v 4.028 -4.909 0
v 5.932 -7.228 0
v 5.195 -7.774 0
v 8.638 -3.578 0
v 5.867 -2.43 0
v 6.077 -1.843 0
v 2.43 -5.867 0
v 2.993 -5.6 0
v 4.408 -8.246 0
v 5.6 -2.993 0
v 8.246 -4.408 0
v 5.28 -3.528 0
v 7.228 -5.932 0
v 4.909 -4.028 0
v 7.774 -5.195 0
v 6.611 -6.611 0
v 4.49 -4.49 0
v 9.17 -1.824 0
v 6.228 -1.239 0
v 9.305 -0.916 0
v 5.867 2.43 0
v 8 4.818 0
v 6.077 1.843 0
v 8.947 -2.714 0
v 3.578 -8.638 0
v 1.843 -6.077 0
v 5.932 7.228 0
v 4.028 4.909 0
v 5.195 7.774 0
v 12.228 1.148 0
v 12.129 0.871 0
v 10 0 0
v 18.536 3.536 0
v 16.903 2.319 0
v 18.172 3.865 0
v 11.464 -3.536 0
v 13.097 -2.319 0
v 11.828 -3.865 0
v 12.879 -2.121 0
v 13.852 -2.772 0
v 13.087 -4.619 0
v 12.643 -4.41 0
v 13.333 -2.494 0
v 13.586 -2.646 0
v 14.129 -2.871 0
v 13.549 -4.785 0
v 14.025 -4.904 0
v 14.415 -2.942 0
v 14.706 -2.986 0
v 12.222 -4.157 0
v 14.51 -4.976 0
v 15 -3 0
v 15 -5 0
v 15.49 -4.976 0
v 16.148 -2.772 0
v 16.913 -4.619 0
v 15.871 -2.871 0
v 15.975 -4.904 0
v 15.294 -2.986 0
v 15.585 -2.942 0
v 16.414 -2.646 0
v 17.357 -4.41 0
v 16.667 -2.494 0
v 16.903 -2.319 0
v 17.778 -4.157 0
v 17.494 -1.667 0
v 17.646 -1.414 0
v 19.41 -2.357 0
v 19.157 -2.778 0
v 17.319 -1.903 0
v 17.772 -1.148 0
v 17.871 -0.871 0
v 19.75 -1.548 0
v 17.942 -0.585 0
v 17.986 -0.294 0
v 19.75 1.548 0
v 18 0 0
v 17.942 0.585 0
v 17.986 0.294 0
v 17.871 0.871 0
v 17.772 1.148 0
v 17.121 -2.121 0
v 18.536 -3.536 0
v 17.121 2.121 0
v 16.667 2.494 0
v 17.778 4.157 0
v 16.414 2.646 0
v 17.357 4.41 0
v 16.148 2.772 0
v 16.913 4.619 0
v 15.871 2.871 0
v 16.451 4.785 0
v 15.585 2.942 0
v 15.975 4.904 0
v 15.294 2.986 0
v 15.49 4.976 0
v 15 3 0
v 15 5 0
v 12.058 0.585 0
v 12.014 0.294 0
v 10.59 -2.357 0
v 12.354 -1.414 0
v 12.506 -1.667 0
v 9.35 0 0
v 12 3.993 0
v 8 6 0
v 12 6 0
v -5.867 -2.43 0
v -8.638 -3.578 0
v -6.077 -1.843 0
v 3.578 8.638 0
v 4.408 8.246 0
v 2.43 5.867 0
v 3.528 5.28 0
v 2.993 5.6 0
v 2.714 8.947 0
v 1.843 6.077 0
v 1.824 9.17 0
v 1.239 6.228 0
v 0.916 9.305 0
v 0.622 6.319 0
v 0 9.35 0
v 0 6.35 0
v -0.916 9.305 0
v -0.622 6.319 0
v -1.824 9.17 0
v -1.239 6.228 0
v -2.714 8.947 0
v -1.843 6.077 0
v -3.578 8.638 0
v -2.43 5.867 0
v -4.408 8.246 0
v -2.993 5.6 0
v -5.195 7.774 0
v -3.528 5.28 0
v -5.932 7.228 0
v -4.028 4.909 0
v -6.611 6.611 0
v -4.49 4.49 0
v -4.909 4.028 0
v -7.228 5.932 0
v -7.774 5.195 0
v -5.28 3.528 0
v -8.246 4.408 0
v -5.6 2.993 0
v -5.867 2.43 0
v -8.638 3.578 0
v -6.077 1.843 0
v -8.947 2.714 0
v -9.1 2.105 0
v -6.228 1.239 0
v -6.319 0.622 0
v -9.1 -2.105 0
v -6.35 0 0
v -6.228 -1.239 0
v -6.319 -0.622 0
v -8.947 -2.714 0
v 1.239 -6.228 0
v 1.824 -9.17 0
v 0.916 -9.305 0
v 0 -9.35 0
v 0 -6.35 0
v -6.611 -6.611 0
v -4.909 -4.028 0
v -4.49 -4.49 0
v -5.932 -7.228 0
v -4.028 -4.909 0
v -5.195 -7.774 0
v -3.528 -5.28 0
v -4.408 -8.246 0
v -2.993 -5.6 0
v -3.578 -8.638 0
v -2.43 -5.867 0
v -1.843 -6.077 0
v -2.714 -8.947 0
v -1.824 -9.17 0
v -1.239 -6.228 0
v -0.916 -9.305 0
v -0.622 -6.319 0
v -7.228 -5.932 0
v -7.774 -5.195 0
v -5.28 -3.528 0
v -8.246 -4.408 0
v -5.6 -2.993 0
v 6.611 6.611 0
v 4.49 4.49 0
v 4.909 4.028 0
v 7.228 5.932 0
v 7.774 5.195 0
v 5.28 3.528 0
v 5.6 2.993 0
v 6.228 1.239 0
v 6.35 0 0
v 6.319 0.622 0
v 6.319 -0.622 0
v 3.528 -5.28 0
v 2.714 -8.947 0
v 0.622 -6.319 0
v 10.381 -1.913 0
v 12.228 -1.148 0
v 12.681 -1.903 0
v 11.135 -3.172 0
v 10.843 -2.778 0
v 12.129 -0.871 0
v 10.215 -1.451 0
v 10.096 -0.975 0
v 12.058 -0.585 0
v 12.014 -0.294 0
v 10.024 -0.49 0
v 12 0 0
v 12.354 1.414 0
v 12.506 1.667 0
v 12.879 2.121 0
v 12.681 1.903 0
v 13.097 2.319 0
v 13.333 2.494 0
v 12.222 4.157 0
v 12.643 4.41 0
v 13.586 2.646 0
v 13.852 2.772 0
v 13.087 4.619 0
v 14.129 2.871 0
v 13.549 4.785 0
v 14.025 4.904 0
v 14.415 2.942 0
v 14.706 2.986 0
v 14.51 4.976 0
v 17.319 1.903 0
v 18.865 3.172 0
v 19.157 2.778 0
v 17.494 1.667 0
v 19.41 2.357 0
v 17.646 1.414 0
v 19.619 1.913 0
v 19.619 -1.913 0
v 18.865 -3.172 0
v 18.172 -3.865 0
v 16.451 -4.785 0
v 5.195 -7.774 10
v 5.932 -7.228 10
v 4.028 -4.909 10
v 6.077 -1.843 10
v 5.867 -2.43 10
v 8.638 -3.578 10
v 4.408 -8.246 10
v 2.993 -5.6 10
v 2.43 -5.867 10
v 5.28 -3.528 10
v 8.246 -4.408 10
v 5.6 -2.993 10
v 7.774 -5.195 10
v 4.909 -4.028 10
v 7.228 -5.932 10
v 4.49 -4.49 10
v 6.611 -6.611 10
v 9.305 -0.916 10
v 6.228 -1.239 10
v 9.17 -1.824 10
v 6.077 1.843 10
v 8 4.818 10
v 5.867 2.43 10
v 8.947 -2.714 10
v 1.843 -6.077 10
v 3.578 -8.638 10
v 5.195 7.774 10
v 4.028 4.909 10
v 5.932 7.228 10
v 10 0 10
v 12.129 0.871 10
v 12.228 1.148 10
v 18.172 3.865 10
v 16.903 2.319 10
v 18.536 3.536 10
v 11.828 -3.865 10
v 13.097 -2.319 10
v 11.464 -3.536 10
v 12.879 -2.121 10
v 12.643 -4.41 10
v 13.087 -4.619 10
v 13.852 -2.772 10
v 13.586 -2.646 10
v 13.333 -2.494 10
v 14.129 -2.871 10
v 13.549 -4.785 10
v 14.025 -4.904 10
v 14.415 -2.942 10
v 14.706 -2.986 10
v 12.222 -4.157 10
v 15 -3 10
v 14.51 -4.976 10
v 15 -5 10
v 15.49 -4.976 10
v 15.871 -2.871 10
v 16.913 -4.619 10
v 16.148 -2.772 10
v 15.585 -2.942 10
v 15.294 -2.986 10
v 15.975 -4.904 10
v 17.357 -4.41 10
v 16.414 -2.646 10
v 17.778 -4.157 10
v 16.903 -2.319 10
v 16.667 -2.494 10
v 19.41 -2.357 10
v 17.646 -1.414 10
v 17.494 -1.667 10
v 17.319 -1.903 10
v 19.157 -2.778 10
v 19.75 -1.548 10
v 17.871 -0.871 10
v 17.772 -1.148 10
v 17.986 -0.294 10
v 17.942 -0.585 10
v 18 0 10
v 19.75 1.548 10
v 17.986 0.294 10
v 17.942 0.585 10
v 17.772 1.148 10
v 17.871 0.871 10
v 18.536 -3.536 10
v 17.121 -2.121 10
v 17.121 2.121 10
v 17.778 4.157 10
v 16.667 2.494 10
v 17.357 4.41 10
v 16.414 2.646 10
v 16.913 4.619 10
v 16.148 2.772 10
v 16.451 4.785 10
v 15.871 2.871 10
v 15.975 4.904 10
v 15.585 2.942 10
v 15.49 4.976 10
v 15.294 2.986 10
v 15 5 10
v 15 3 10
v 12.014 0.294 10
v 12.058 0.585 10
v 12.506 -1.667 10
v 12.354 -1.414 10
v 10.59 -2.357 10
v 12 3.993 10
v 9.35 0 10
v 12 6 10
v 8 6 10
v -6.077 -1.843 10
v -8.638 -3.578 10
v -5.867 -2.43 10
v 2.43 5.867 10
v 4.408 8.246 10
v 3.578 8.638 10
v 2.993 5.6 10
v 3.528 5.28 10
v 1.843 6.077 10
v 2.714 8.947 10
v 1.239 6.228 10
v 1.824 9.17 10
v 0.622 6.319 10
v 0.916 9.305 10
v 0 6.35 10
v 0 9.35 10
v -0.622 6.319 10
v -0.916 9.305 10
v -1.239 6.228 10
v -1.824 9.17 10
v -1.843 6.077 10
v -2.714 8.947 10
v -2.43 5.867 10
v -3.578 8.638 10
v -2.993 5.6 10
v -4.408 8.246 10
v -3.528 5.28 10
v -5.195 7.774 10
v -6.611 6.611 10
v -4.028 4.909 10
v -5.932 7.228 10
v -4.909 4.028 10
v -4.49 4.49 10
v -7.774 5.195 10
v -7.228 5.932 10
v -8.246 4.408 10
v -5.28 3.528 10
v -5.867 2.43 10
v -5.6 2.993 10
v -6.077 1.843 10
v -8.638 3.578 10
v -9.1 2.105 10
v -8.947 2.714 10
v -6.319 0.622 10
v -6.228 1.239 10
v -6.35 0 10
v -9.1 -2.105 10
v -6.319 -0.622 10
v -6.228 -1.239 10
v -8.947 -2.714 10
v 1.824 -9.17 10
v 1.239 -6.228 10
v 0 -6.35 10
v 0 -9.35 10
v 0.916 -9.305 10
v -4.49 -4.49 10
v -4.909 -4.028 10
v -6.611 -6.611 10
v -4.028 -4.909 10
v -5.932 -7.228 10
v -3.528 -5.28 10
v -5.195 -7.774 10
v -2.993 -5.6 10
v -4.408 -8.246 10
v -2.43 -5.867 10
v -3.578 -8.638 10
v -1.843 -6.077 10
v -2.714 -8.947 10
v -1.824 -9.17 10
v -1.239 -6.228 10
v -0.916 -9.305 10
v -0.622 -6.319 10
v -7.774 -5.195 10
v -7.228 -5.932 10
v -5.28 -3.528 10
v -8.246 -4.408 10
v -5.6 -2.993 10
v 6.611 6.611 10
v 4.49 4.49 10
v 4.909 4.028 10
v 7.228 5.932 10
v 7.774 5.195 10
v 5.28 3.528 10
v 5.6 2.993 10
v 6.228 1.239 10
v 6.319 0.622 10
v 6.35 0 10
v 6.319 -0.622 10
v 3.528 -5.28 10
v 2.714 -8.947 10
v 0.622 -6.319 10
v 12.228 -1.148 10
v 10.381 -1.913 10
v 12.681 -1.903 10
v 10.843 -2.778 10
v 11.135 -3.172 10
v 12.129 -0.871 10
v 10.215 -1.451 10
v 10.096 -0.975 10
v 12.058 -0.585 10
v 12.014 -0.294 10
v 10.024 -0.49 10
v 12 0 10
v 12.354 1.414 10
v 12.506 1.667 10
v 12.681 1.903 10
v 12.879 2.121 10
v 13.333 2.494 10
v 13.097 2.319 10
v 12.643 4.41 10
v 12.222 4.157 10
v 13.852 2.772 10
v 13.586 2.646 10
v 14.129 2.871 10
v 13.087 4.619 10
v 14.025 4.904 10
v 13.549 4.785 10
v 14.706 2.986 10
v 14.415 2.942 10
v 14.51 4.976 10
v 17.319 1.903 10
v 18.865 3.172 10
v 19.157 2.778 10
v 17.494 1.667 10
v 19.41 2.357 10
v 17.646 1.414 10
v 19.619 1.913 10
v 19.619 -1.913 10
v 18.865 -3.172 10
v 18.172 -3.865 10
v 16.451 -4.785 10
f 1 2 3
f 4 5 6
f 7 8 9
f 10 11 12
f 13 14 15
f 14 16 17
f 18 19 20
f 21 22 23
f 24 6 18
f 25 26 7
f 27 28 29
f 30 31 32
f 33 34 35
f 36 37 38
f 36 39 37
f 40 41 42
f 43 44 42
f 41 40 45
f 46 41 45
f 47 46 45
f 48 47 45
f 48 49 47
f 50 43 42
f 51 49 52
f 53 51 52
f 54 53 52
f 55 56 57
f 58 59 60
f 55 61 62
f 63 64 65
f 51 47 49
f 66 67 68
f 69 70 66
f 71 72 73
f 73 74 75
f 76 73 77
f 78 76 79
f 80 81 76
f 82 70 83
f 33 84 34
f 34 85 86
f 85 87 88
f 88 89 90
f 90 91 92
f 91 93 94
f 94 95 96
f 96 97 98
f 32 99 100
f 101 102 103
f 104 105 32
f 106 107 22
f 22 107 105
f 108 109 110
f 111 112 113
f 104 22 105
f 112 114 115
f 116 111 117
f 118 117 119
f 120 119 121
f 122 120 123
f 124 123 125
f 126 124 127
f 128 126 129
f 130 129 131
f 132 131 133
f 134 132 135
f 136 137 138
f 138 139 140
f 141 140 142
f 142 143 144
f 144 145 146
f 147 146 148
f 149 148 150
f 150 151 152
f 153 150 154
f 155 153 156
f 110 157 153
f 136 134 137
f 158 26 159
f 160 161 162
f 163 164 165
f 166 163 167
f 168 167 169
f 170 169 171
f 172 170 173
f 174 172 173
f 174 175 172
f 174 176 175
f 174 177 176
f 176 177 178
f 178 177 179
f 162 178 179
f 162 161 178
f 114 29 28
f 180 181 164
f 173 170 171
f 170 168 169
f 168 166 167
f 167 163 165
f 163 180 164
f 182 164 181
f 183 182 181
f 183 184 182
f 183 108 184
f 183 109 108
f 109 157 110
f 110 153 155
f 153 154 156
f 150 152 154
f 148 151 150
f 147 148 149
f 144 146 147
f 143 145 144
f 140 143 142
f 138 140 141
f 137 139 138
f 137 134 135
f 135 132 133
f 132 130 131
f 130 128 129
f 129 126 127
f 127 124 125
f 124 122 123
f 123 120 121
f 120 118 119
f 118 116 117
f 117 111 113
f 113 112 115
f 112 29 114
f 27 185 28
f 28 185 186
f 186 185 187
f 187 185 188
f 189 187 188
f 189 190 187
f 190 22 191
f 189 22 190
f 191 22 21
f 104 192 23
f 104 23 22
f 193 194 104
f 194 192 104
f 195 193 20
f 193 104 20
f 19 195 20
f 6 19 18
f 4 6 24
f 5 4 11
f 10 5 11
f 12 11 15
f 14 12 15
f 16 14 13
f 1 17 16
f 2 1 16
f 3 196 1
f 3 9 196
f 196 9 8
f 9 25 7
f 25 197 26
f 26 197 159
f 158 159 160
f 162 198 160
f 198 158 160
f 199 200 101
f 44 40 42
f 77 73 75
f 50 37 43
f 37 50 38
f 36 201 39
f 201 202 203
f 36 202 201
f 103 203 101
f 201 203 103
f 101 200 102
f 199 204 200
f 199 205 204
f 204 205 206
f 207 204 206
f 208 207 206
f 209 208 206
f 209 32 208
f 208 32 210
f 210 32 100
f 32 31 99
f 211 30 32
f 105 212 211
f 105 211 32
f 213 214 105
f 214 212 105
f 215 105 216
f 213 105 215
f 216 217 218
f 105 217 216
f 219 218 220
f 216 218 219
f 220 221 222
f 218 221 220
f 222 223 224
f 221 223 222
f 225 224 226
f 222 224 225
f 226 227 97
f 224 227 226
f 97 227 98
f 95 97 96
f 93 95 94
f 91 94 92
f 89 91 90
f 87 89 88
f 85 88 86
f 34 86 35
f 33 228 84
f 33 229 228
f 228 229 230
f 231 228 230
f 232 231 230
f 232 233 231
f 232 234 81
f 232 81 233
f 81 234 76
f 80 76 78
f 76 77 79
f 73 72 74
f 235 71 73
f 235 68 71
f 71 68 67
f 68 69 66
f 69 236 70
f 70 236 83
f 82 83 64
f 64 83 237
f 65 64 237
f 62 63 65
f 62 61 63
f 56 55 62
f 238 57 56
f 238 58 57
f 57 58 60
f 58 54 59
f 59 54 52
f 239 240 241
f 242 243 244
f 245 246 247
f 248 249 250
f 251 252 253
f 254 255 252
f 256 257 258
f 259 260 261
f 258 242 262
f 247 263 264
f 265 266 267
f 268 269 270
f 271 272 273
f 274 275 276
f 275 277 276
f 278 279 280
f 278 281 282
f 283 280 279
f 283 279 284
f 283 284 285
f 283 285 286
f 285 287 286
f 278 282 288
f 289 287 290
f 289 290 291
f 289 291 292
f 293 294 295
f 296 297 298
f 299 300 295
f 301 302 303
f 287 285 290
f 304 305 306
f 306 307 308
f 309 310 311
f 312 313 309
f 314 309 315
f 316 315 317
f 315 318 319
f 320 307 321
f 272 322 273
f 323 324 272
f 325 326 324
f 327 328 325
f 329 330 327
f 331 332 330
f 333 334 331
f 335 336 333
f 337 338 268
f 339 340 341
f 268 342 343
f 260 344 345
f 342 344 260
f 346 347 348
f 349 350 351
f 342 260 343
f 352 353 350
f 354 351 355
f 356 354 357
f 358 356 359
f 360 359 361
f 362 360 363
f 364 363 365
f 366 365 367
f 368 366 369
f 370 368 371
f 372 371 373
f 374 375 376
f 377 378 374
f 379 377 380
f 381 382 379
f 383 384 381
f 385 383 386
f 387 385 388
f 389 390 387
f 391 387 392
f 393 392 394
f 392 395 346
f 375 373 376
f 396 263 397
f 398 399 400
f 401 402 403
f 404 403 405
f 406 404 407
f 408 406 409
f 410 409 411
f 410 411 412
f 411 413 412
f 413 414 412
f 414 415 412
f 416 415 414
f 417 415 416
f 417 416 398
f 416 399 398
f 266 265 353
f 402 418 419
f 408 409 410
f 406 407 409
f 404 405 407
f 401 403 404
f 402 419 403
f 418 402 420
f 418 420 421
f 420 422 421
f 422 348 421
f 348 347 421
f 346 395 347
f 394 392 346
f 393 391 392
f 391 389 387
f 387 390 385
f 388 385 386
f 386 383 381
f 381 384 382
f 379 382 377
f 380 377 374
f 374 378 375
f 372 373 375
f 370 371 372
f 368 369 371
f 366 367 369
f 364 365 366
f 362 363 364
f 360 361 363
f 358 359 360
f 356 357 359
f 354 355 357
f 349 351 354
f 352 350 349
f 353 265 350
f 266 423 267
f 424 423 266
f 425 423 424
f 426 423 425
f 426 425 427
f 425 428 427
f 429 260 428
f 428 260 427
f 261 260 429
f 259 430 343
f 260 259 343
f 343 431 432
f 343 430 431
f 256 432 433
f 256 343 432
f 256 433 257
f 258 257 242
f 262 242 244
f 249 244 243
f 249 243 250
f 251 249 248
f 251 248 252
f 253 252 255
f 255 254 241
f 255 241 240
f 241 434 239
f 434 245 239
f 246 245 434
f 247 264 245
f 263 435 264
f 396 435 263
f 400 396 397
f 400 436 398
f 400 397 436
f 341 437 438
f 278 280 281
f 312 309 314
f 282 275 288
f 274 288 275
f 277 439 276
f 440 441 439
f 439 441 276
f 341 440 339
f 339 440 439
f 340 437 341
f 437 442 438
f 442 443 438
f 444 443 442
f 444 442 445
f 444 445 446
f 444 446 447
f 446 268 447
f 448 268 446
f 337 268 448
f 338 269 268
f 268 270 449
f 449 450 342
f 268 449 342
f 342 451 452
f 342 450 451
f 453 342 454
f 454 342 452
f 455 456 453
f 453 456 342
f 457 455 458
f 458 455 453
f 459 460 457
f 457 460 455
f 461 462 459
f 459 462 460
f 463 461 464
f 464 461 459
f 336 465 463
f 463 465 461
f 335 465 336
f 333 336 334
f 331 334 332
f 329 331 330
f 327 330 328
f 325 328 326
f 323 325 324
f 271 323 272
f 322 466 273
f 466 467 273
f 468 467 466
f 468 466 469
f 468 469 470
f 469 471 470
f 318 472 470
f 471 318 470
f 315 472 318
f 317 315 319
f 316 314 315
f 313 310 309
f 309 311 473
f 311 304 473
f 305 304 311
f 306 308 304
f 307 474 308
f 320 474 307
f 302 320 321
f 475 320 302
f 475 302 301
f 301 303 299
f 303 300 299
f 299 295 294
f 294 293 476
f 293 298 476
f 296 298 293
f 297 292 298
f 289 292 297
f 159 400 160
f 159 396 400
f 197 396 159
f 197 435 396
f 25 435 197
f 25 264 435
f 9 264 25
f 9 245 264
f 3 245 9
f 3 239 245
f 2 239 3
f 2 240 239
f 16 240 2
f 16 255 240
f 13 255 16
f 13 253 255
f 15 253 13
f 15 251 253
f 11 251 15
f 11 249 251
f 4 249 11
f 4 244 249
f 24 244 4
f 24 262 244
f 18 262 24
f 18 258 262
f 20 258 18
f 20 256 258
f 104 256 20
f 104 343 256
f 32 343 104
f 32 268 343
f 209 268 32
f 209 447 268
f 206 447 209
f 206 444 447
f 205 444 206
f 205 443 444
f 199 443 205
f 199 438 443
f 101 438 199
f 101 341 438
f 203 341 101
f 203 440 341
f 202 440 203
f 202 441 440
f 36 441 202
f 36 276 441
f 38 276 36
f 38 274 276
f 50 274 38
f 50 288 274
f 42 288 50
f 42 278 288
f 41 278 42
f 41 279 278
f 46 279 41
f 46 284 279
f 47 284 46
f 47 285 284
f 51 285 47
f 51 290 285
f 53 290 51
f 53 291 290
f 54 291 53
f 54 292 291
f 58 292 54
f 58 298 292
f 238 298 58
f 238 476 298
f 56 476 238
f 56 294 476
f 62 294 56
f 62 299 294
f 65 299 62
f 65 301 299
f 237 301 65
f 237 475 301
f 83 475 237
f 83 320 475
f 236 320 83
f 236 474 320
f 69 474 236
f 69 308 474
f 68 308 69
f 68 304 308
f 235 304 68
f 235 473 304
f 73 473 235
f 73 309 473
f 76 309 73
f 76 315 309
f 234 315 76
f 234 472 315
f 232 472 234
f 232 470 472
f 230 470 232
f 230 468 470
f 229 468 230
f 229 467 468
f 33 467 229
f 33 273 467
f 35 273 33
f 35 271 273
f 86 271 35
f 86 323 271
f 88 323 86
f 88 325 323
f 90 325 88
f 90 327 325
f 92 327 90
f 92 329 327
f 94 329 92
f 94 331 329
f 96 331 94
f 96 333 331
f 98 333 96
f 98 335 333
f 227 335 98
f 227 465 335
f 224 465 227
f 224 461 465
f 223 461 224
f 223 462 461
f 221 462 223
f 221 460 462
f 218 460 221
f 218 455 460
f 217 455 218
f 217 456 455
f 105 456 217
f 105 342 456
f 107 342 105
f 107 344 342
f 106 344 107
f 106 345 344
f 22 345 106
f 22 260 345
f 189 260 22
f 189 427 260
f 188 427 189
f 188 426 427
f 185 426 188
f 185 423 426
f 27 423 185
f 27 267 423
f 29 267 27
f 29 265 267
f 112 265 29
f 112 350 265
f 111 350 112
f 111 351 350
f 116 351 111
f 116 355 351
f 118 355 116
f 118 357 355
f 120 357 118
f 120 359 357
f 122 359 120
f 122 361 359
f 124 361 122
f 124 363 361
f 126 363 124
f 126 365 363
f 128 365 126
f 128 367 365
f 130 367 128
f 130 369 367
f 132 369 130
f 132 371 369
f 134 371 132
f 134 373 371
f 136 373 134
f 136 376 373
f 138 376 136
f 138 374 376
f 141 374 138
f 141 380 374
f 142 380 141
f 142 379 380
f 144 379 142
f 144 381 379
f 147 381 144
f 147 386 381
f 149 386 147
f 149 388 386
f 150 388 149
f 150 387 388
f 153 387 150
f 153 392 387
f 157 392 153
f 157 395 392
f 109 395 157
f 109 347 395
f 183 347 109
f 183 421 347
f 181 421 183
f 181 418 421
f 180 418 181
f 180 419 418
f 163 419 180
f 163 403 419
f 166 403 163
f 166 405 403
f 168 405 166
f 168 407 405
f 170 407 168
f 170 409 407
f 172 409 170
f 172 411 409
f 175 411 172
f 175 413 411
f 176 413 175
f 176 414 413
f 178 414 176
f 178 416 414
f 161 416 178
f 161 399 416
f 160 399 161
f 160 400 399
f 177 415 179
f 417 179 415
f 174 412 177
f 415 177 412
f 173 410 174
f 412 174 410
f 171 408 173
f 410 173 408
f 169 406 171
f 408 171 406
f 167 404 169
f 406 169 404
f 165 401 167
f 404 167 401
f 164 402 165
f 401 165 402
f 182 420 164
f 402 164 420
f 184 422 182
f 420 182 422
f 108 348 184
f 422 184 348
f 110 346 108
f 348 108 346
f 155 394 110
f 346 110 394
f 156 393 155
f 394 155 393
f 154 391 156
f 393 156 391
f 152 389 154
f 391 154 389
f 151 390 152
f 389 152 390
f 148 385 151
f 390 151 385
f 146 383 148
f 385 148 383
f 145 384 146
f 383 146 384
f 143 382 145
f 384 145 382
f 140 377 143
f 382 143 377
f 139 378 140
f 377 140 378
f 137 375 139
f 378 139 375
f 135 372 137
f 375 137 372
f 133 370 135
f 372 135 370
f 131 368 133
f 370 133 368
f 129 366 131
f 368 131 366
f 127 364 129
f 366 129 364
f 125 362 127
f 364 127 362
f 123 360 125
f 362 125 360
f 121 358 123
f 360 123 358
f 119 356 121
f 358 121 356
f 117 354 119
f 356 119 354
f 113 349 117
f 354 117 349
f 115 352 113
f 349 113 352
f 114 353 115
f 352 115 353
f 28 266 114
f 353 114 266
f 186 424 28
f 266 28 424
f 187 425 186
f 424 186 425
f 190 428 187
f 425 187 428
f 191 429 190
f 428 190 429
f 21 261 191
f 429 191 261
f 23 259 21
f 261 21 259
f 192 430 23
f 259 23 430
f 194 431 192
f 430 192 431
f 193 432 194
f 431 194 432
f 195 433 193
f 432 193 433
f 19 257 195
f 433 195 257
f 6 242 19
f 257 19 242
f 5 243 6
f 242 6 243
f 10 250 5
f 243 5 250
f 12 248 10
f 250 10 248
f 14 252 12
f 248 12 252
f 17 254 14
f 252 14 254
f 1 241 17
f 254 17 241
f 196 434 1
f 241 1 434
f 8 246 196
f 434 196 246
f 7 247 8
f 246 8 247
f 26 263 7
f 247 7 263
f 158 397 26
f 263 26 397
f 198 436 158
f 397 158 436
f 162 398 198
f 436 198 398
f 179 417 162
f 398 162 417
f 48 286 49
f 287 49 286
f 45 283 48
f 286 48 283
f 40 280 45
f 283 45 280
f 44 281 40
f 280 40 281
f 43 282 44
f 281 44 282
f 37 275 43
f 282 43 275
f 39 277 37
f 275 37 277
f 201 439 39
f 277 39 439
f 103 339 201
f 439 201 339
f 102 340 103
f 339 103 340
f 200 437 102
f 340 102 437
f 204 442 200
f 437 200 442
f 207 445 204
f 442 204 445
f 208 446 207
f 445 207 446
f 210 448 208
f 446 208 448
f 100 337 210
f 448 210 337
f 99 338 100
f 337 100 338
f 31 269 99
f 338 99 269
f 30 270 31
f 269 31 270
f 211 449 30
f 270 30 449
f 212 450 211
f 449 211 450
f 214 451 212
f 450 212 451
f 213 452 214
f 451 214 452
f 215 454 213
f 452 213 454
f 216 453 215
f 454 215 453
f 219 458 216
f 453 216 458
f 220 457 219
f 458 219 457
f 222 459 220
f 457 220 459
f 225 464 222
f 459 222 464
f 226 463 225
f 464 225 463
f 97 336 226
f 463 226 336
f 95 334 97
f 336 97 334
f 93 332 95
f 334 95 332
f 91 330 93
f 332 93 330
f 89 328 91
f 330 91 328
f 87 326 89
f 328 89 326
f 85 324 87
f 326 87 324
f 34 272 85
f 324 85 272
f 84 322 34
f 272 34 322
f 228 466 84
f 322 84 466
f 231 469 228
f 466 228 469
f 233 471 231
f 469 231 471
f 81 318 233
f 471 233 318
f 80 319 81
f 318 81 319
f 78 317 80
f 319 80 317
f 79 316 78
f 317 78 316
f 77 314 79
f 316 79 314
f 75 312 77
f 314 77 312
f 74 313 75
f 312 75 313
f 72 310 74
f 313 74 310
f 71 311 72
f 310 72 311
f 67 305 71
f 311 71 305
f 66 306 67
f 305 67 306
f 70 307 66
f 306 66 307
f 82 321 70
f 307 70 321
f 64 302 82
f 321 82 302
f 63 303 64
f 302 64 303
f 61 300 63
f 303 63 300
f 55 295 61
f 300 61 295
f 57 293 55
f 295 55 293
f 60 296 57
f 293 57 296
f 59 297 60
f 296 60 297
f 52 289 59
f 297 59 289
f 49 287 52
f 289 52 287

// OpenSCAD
// Snap-on clip for 12.7 mm lab stand rod and 6 mm ID tubing
// Printed flat (Z = 10 mm extrusion of XY profile)

// Global settings
$fn = 64;
height = 10; // Extrusion height in Z

// Rod ring dimensions
rod_id = 12.7; // Inner diameter of rod ring
rod_wall = 3; // Wall thickness of rod ring
rod_od = rod_id + 2 * rod_wall; // Outer diameter of rod ring (18.7 mm)

// Rod ring cutout dimensions
rod_cutout_width = 10; // Width of the opening on the -X side
rod_cutout_half_width = rod_cutout_width / 2; // Half-width for symmetric bounds

// Tubing ring dimensions
tubing_id = 6; // Inner diameter of tubing ring
tubing_wall = 2; // Wall thickness of tubing ring
tubing_od = tubing_id + 2 * tubing_wall; // Outer diameter of tubing ring (10 mm)
tubing_center_x = 15; // X-coordinate of tubing ring center

// Tubing ring cutout dimensions
tubing_cutout_width = 4.5; // Width of the opening on the +X side
tubing_cutout_half_width = tubing_cutout_width / 2; // Half-width for symmetric bounds

// Bridge dimensions
bridge_x_start = 8; // Start X of the bridge
bridge_x_end = 12; // End X of the bridge
bridge_width = 6; // Width of the bridge in Y
bridge_half_width = bridge_width / 2; // Half-width for symmetric bounds

// Safety margin for cuts (ensures no coplanar faces)
cut_margin = 0.5;

// Main module
linear_extrude(height = height, center = false, convexity = 10) {
    union() {
        // Rod ring centered at origin
        difference() {
            // Outer circle of rod ring
            circle(r = rod_od / 2);
            // Inner hole of rod ring
            circle(r = rod_id / 2);
            // Cutout on -X side: extends from x = -infinity to x = 0, y = -5 to 5
            // We use a large rectangle to ensure it cuts through the ring
            translate([-rod_od, 0])
                square([rod_od + cut_margin, rod_cutout_width + 2 * cut_margin], center = true);
        }

        // Tubing ring centered at (15, 0)
        difference() {
            // Outer circle of tubing ring
            translate([tubing_center_x, 0])
                circle(r = tubing_od / 2);
            // Inner hole of tubing ring
            translate([tubing_center_x, 0])
                circle(r = tubing_id / 2);
            // Cutout on +X side: extends from x = 15 to +infinity, y = -2.25 to 2.25
            translate([tubing_center_x + tubing_od, 0])
                square([tubing_od + cut_margin, tubing_cutout_width + 2 * cut_margin], center = true);
        }

        // Solid bridge between x = 8 and x = 12, width 6 mm in Y
        translate([bridge_x_start, 0])
            square([bridge_x_end - bridge_x_start, bridge_width], center = false);
    }
}
